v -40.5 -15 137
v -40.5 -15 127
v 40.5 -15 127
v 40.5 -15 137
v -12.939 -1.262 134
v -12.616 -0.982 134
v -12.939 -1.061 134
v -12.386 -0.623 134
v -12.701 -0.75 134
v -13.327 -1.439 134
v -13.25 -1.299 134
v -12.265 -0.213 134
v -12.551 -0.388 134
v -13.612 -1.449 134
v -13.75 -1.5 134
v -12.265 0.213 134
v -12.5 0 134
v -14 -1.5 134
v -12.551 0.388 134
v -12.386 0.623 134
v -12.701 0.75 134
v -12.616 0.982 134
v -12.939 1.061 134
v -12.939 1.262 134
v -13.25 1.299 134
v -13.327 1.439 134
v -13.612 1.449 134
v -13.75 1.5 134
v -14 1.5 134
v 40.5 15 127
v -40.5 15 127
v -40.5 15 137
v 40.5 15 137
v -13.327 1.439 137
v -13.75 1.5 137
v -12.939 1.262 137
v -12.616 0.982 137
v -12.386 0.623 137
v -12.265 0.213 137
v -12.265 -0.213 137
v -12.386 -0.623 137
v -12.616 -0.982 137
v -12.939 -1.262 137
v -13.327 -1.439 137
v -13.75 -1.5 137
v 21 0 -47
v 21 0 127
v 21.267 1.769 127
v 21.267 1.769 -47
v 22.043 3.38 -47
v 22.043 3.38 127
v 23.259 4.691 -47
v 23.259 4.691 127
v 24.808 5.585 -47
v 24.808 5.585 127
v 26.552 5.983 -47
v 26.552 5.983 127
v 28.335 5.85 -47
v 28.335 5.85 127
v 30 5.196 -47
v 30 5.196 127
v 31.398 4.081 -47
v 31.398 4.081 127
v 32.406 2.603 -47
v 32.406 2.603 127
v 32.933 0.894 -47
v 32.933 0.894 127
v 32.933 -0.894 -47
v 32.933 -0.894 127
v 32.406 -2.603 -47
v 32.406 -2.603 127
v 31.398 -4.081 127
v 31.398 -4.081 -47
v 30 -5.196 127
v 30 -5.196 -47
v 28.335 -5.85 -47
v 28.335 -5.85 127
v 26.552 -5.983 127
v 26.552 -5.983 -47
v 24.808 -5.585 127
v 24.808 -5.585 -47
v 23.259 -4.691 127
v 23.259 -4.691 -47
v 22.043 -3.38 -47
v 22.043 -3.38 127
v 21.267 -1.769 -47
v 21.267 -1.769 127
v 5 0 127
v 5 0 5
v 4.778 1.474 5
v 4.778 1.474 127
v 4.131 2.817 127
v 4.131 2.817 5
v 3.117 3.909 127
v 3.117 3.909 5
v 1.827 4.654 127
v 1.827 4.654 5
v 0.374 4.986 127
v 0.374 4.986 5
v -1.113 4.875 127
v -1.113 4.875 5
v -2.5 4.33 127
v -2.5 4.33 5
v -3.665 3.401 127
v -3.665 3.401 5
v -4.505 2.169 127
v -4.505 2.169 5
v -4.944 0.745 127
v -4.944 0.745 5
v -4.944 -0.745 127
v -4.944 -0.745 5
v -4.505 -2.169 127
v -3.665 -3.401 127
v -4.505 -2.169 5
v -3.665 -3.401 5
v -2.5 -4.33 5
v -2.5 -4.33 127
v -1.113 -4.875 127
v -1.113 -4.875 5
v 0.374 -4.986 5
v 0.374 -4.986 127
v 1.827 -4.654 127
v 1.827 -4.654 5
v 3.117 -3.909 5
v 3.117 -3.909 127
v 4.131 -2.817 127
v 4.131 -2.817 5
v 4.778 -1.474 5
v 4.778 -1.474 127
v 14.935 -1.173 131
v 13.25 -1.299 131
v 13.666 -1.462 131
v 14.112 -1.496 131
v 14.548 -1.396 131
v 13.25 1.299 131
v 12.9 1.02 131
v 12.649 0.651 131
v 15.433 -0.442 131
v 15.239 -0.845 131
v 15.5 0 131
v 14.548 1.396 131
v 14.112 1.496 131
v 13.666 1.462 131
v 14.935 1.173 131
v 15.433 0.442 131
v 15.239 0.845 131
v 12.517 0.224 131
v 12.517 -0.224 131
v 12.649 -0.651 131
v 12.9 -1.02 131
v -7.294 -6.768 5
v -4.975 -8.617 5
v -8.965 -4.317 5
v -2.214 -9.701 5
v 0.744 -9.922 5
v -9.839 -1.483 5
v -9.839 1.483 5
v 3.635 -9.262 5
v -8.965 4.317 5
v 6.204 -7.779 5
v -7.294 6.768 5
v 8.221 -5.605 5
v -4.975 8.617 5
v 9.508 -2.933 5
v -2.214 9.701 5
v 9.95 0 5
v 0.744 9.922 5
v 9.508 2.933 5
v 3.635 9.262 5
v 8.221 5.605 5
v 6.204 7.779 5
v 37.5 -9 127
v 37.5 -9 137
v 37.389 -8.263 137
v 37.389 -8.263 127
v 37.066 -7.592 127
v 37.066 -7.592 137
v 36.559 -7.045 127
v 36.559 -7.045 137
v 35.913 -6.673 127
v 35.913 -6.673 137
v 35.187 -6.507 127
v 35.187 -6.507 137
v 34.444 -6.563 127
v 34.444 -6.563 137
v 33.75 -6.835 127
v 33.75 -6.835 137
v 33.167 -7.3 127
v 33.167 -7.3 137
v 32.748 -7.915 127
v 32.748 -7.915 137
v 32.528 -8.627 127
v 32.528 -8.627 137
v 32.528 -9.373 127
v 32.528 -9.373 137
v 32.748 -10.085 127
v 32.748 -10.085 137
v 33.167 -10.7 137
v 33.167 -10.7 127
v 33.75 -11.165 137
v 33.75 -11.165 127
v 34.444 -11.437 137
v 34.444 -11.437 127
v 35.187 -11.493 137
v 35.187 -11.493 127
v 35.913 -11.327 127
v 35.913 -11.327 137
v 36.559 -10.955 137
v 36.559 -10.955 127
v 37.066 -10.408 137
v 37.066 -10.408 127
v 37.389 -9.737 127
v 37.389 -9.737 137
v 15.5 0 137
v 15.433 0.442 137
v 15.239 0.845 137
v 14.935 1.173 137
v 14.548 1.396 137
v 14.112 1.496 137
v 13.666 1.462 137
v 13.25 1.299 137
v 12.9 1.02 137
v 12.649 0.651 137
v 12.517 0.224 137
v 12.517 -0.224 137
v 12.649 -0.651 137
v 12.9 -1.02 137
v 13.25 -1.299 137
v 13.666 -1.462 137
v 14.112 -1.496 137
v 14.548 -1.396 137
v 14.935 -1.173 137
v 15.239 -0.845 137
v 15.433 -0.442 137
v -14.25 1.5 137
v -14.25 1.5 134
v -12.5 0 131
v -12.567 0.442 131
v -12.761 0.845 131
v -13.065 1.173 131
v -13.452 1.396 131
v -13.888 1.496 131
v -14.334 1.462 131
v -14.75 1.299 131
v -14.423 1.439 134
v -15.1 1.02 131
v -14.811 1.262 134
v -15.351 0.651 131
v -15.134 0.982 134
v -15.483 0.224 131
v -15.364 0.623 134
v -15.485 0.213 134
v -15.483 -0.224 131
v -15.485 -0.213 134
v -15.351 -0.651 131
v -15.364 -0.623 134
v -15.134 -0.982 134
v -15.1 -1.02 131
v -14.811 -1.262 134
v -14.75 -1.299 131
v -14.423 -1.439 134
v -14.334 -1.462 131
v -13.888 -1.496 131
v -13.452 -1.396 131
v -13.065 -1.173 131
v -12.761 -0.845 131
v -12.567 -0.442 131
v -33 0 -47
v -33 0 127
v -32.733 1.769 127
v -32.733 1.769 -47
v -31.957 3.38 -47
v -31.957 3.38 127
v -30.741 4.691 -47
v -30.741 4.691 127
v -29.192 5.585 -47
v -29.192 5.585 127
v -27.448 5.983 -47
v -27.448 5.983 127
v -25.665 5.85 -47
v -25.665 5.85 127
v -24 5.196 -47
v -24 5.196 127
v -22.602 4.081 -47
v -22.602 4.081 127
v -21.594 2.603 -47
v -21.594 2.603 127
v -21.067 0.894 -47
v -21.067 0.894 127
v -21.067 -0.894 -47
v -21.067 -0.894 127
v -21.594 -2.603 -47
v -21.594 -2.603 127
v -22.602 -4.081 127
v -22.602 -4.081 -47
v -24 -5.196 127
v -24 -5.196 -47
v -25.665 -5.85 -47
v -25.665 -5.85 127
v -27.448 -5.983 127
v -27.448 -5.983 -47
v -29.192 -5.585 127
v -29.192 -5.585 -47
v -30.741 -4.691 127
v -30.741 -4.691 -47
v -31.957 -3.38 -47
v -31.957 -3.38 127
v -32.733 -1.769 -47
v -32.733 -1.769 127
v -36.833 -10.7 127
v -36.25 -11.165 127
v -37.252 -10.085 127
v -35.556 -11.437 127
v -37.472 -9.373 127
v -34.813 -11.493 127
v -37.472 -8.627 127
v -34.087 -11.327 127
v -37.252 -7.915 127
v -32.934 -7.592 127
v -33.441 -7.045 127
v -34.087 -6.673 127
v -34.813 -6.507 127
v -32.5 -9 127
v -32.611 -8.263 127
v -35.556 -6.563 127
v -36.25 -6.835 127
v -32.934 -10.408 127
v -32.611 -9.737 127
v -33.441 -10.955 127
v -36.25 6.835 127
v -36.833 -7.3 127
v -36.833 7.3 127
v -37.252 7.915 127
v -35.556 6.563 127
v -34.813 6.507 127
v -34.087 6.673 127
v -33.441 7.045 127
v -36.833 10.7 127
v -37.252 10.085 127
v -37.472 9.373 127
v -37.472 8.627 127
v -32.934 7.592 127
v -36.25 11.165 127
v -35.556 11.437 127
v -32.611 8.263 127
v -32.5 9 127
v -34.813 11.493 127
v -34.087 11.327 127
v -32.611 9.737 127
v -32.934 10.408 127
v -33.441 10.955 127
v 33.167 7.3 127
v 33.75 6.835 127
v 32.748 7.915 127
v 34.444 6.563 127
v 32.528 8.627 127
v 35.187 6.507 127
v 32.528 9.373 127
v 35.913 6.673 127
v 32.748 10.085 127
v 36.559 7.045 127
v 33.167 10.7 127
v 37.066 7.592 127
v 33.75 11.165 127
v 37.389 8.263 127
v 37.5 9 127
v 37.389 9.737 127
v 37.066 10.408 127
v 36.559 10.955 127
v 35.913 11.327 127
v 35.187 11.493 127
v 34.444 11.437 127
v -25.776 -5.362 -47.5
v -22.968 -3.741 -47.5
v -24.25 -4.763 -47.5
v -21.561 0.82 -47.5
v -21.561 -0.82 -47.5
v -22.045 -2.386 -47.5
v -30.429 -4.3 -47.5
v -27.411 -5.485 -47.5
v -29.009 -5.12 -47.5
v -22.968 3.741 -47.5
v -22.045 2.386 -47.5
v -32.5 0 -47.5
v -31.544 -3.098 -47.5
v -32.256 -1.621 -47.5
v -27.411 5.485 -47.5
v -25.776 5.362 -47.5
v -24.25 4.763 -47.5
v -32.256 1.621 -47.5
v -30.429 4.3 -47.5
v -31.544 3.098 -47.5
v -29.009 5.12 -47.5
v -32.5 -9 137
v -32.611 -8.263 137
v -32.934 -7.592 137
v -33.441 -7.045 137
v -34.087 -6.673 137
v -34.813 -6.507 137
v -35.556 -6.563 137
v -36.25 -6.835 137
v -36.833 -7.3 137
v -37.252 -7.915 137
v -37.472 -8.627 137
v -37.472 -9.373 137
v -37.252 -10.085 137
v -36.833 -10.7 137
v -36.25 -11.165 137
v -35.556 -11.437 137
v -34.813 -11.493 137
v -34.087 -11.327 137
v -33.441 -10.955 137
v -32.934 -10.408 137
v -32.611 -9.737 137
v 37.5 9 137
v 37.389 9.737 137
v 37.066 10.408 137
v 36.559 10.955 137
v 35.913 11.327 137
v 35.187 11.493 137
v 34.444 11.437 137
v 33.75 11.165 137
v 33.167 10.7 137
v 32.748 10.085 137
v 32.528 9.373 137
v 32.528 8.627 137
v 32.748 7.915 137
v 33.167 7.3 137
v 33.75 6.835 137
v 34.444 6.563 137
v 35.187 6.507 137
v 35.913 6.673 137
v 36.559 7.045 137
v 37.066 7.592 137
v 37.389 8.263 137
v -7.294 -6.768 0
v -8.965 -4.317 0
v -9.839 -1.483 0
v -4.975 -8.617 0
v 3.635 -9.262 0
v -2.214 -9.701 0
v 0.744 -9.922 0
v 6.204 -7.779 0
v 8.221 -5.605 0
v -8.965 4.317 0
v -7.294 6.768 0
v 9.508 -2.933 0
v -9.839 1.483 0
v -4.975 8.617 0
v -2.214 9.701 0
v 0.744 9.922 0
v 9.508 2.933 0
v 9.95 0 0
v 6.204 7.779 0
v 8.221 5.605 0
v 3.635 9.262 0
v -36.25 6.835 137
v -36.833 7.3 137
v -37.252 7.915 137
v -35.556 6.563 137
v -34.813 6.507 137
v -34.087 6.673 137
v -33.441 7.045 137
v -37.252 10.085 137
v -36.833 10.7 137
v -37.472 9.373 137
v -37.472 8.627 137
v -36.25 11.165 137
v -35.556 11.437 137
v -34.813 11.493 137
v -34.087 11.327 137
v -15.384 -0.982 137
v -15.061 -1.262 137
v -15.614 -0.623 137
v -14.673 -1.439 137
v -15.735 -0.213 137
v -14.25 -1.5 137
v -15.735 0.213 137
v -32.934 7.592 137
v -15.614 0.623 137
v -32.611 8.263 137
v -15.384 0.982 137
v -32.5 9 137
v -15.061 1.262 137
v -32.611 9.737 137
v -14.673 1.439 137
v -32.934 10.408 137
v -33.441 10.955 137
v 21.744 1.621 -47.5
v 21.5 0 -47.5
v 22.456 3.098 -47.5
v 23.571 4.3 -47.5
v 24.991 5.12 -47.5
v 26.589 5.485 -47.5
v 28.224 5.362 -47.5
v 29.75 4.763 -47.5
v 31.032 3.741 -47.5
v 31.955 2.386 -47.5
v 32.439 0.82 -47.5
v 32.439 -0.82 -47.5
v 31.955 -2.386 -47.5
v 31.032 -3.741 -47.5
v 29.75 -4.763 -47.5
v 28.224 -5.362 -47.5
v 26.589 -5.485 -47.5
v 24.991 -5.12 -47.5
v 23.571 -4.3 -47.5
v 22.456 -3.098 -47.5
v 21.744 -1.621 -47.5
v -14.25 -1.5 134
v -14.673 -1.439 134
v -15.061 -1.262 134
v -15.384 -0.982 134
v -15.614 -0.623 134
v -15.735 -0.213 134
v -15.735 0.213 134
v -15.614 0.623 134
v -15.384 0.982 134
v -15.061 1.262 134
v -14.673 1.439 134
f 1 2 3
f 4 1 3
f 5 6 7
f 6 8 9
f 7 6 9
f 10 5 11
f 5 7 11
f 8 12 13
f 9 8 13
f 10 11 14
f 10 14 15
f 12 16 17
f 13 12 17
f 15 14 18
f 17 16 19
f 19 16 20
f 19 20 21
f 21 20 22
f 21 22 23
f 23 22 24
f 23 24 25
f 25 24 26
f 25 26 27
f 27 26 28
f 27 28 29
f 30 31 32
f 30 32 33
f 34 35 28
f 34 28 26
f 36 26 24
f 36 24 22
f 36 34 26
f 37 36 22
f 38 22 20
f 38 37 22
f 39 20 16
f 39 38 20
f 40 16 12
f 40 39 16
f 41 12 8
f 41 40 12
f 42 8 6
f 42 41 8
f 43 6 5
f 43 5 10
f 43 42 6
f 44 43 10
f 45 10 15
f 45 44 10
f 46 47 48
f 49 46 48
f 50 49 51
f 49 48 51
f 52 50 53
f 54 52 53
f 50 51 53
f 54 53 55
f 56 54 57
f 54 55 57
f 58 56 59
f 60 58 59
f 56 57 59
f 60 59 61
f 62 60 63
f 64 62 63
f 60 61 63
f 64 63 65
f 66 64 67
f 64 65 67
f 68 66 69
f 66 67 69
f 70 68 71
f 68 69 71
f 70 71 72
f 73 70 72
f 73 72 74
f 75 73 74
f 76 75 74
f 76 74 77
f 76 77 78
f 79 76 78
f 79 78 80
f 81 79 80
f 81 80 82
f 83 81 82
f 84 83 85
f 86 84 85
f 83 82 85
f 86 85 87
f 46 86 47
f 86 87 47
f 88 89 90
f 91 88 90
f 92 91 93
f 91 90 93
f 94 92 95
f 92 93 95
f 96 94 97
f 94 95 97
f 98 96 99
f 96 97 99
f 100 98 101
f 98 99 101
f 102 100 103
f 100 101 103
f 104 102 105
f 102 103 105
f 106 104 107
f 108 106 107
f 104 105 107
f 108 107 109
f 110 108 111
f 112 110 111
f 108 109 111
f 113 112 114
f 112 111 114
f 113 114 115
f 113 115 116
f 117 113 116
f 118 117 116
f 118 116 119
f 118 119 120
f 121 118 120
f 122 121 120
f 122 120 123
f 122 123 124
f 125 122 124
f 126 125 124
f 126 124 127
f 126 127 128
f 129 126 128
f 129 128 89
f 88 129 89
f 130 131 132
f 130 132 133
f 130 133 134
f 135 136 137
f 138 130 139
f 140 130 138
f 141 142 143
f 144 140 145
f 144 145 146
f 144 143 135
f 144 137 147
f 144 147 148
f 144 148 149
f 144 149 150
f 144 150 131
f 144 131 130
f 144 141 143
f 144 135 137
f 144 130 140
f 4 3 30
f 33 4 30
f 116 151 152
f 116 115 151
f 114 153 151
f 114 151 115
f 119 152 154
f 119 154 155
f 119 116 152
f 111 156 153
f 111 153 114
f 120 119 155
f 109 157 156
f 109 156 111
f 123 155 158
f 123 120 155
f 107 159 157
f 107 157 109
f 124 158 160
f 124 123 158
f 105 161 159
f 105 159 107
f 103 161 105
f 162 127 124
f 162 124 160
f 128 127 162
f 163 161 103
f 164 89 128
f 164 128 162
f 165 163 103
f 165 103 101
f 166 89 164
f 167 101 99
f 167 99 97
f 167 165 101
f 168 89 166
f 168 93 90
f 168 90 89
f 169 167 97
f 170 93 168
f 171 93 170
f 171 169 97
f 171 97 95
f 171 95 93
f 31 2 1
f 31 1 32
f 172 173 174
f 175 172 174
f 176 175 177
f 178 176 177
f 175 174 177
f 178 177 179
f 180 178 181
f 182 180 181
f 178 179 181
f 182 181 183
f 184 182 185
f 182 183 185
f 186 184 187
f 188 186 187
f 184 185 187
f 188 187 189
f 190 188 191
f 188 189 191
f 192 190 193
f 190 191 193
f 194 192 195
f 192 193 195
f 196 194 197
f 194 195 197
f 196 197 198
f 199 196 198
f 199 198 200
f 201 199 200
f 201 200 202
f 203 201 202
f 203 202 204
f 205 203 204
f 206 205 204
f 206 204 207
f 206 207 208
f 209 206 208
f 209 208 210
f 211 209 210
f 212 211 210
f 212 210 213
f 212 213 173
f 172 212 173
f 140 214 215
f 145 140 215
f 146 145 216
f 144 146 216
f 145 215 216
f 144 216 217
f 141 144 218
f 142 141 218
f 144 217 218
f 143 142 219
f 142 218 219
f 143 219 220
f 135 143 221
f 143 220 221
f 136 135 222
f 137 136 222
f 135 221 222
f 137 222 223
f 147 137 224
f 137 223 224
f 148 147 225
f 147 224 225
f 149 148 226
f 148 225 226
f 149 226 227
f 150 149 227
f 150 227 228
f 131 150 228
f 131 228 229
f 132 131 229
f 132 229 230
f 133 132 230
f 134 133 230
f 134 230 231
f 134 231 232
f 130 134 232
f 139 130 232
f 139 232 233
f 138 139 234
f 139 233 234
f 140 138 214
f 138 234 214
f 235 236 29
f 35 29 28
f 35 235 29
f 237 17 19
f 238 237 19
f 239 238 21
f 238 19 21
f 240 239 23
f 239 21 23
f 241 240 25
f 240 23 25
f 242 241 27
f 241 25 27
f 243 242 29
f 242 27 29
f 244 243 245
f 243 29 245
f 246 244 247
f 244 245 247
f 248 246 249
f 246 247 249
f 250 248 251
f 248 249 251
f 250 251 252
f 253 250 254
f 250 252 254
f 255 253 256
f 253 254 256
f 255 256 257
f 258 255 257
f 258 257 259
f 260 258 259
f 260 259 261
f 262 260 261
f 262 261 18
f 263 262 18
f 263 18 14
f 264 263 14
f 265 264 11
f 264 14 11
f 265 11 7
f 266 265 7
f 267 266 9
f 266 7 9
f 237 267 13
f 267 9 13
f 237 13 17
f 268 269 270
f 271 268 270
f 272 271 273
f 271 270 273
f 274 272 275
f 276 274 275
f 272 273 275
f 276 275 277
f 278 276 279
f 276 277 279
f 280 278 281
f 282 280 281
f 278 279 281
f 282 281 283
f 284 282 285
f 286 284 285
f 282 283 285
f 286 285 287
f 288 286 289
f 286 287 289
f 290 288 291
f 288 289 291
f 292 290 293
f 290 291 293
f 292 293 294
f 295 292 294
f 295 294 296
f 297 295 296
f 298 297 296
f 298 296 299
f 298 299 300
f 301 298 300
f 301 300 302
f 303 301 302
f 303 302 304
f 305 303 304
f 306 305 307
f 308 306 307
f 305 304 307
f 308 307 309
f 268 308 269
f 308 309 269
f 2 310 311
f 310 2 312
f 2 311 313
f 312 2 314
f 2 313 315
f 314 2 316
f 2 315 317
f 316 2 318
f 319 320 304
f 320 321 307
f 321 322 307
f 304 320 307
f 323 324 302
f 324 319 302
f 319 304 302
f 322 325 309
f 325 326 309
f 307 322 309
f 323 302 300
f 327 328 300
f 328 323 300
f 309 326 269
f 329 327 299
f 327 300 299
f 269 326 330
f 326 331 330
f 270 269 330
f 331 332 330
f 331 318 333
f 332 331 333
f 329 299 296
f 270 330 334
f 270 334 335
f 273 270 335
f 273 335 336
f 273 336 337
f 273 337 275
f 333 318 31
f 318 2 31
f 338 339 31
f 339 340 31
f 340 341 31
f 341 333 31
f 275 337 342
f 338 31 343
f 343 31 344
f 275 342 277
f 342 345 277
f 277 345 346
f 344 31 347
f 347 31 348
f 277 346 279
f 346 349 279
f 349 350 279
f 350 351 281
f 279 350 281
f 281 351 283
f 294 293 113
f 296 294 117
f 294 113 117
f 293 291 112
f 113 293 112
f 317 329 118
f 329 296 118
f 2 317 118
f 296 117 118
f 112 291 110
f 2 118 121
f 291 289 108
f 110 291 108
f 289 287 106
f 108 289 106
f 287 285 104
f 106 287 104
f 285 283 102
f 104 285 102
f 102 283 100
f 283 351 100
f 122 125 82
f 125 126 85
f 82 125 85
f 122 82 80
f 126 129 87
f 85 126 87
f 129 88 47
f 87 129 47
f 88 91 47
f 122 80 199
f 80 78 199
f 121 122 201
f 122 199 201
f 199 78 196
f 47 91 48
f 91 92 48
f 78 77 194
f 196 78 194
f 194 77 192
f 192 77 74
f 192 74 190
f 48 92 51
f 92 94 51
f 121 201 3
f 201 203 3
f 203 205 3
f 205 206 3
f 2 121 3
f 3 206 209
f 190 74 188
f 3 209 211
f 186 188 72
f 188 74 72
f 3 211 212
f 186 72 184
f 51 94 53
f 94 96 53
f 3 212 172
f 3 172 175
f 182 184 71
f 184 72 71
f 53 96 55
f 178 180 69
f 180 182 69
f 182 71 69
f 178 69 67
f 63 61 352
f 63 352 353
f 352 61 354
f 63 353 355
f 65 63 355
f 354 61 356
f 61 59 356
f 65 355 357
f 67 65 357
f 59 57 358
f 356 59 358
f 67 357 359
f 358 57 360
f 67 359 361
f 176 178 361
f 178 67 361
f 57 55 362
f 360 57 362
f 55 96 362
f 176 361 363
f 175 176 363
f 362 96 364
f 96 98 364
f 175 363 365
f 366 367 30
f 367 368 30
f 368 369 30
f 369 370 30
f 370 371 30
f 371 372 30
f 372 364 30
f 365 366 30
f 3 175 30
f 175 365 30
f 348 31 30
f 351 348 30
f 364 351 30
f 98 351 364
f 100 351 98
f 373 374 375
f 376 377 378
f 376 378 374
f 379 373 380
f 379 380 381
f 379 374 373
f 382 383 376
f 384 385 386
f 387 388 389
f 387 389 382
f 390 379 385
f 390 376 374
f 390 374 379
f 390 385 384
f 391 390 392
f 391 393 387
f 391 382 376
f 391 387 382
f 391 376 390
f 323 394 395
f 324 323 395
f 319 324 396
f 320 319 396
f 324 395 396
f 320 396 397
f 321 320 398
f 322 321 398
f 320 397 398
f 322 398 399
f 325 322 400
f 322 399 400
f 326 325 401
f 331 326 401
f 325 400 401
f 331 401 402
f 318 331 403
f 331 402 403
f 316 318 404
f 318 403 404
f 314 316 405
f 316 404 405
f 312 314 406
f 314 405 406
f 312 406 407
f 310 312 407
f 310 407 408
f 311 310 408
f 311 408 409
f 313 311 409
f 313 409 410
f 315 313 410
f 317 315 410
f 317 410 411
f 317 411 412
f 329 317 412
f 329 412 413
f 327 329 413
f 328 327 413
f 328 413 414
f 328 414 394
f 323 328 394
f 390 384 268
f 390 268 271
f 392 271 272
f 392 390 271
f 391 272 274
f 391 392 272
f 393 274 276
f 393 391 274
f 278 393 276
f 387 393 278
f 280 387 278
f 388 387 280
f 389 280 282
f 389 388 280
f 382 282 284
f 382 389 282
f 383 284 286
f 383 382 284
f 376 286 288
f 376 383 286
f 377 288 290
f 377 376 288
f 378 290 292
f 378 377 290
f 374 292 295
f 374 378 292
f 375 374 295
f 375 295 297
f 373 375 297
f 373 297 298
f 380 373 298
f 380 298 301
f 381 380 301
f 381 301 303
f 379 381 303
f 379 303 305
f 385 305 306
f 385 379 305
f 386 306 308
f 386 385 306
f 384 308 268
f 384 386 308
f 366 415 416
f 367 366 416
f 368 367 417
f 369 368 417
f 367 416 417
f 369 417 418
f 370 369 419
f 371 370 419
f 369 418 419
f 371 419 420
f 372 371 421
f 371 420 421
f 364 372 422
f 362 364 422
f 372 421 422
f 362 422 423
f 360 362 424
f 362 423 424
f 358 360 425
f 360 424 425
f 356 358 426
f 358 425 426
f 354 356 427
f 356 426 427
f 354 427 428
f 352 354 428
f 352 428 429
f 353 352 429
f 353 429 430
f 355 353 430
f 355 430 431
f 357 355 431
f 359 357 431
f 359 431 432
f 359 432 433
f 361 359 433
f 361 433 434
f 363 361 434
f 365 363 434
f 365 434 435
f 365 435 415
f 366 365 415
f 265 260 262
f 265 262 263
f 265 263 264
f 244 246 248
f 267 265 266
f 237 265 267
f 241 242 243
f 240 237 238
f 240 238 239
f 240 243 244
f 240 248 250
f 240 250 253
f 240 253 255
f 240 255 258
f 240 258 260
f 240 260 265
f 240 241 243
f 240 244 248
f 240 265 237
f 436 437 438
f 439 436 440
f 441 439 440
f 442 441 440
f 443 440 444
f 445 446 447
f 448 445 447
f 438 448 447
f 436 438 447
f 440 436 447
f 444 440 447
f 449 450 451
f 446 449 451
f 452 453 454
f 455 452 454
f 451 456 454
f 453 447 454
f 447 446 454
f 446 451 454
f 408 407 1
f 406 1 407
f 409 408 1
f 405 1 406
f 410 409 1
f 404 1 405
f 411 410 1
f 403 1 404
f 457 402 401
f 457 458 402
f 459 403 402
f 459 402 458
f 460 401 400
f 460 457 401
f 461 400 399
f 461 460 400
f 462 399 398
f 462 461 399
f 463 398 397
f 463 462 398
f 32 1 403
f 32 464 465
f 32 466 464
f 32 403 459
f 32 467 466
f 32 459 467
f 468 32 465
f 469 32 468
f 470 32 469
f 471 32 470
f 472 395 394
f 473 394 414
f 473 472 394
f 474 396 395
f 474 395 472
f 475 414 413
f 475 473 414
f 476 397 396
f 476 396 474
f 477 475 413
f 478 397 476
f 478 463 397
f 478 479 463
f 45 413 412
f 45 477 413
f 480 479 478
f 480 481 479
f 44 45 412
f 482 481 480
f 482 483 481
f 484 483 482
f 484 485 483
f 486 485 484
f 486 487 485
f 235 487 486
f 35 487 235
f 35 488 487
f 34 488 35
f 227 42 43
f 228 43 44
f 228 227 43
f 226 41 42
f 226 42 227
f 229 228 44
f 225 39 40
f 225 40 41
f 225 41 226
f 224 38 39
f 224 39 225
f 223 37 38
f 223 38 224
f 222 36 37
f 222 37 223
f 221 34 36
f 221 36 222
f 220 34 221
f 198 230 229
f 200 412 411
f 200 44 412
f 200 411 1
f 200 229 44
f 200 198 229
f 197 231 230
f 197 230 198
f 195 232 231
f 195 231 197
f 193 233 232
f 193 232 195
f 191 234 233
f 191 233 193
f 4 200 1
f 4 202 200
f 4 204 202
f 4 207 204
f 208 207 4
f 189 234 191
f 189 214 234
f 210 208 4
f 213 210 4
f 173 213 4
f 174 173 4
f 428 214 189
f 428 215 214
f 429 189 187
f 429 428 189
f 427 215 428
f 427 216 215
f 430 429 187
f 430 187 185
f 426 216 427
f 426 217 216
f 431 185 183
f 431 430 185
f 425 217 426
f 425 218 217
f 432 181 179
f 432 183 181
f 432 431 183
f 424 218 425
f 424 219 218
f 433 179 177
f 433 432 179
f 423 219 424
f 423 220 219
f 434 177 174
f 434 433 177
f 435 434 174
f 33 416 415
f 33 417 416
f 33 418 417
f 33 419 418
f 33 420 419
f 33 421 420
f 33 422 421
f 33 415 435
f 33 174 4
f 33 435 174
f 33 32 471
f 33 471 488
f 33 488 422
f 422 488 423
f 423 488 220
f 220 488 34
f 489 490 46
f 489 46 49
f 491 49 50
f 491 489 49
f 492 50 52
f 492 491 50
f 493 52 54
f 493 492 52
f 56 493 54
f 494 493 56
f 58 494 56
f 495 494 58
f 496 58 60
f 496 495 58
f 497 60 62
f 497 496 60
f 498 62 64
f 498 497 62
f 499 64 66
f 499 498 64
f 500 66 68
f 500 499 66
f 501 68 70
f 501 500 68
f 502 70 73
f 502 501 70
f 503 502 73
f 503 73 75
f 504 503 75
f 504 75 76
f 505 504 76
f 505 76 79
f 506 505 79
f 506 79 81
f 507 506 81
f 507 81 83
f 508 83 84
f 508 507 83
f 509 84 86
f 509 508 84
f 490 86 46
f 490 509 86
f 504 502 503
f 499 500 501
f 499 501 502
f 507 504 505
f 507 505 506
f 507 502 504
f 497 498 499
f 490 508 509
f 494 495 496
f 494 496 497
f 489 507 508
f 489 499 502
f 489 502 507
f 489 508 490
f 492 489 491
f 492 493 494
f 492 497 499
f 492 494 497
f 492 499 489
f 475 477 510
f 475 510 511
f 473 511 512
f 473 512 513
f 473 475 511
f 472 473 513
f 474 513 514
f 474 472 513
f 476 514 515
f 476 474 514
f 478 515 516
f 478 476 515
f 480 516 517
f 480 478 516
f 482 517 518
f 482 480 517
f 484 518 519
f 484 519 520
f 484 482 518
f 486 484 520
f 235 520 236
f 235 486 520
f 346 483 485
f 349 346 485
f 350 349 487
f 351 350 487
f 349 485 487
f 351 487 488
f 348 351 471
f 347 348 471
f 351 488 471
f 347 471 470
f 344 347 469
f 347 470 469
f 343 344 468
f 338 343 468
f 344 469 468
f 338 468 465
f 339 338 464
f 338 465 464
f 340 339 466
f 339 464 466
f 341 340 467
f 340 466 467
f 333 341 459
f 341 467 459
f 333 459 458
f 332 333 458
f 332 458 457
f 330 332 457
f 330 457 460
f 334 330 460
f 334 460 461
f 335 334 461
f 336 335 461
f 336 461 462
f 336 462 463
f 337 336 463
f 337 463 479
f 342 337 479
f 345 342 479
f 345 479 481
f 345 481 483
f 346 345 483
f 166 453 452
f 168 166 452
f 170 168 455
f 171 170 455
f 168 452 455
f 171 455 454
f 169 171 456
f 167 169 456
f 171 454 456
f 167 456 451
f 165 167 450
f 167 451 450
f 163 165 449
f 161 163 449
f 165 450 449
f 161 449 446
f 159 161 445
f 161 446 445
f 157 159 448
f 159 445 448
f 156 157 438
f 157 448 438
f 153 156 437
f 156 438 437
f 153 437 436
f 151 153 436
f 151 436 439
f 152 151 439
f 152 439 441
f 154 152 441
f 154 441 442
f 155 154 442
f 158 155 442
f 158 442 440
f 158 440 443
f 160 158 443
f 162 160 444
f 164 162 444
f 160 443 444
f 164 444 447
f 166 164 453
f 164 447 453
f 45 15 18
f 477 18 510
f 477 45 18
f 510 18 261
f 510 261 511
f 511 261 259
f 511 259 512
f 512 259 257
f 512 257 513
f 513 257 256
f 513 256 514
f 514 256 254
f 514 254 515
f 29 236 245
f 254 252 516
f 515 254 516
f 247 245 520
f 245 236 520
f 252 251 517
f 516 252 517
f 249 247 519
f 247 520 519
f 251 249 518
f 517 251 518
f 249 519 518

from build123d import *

# Parameters (mm, degrees)
SKETCH1_R           = 9.95
PISTON_DEPTH        = 5
SKETCH2_R           = 5
ROD_DEPTH           = 127
SKETCH3_W           = 81
SKETCH3_H           = 30
PLATE_DEPTH         = 10
SKETCH4_R           = 6
GUIDES_DEPTH        = 174.5
SKETCH5_R           = 1.5
MOUNTHOLES_DEPTH    = 6
CHAMFER1_SIZE       = 0.5
SKETCH6_R           = 2.5
MOUNTHOLES2_DEPTH   = 185.5
CUT_EXTRUDE1X_DEPTH = 3


with BuildPart() as part:
    # Sketch1 → Piston (new body)
    with BuildSketch(Plane.XY):
        Circle(SKETCH1_R)
    extrude(amount=PISTON_DEPTH)

    # Sketch2 → Rod (add)
    with BuildSketch(Plane.XY):
        Circle(SKETCH2_R)
    extrude(amount=ROD_DEPTH)

    # Sketch3 → Plate (add)
    with BuildSketch(Plane.XY.offset(127)):
        Rectangle(SKETCH3_W, SKETCH3_H)
    extrude(amount=PLATE_DEPTH)

    # Sketch4 → Guides (add)
    with BuildSketch(Plane(origin=(0, 0, 127), x_dir=(-1, 0, 0), z_dir=(0, 0, -1))):
        with Locations((-27, 0)):
            Circle(SKETCH4_R)
        with Locations((27, 0)):
            Circle(SKETCH4_R)
    extrude(amount=GUIDES_DEPTH)

    # Sketch5 → MountHoles (cut)
    with BuildSketch(Plane.XY.offset(137)):
        with Locations((14, 0)):
            Circle(SKETCH5_R)
        with Locations((-14, 0)):
            Circle(SKETCH5_R)
    extrude(amount=-MOUNTHOLES_DEPTH, mode=Mode.SUBTRACT)

    # Chamfer1
    chamfer1_edges = [part.edges().sort_by_distance(p)[0] for p in [
        (33, 0, -47.5),
        (-21, 0, -47.5),
    ]]
    chamfer(chamfer1_edges, length=CHAMFER1_SIZE)

    # Sketch6 → MountHoles2 (cut, through all)
    with BuildSketch(Plane.XY.offset(137)):
        with Locations((35, 9)):
            Circle(SKETCH6_R)
        with Locations((-35, 9)):
            Circle(SKETCH6_R)
        with Locations((35, -9)):
            Circle(SKETCH6_R)
        with Locations((-35, -9)):
            Circle(SKETCH6_R)
    extrude(amount=-MOUNTHOLES2_DEPTH, mode=Mode.SUBTRACT)

    # Sketch7 → Cut-Extrude1X (cut)
    with BuildSketch(Plane.XY.offset(137)):
        with BuildLine():
            Line((-14.25, 1.5), (-13.75, 1.5))
            ThreePointArc((-13.75, 1.5), (-12.25, 0), (-13.75, -1.5))
            Line((-13.75, -1.5), (-14.25, -1.5))
            ThreePointArc((-14.25, -1.5), (-15.75, 0), (-14.25, 1.5))
        make_face()
    extrude(amount=-CUT_EXTRUDE1X_DEPTH, mode=Mode.SUBTRACT)


solid = part.part
